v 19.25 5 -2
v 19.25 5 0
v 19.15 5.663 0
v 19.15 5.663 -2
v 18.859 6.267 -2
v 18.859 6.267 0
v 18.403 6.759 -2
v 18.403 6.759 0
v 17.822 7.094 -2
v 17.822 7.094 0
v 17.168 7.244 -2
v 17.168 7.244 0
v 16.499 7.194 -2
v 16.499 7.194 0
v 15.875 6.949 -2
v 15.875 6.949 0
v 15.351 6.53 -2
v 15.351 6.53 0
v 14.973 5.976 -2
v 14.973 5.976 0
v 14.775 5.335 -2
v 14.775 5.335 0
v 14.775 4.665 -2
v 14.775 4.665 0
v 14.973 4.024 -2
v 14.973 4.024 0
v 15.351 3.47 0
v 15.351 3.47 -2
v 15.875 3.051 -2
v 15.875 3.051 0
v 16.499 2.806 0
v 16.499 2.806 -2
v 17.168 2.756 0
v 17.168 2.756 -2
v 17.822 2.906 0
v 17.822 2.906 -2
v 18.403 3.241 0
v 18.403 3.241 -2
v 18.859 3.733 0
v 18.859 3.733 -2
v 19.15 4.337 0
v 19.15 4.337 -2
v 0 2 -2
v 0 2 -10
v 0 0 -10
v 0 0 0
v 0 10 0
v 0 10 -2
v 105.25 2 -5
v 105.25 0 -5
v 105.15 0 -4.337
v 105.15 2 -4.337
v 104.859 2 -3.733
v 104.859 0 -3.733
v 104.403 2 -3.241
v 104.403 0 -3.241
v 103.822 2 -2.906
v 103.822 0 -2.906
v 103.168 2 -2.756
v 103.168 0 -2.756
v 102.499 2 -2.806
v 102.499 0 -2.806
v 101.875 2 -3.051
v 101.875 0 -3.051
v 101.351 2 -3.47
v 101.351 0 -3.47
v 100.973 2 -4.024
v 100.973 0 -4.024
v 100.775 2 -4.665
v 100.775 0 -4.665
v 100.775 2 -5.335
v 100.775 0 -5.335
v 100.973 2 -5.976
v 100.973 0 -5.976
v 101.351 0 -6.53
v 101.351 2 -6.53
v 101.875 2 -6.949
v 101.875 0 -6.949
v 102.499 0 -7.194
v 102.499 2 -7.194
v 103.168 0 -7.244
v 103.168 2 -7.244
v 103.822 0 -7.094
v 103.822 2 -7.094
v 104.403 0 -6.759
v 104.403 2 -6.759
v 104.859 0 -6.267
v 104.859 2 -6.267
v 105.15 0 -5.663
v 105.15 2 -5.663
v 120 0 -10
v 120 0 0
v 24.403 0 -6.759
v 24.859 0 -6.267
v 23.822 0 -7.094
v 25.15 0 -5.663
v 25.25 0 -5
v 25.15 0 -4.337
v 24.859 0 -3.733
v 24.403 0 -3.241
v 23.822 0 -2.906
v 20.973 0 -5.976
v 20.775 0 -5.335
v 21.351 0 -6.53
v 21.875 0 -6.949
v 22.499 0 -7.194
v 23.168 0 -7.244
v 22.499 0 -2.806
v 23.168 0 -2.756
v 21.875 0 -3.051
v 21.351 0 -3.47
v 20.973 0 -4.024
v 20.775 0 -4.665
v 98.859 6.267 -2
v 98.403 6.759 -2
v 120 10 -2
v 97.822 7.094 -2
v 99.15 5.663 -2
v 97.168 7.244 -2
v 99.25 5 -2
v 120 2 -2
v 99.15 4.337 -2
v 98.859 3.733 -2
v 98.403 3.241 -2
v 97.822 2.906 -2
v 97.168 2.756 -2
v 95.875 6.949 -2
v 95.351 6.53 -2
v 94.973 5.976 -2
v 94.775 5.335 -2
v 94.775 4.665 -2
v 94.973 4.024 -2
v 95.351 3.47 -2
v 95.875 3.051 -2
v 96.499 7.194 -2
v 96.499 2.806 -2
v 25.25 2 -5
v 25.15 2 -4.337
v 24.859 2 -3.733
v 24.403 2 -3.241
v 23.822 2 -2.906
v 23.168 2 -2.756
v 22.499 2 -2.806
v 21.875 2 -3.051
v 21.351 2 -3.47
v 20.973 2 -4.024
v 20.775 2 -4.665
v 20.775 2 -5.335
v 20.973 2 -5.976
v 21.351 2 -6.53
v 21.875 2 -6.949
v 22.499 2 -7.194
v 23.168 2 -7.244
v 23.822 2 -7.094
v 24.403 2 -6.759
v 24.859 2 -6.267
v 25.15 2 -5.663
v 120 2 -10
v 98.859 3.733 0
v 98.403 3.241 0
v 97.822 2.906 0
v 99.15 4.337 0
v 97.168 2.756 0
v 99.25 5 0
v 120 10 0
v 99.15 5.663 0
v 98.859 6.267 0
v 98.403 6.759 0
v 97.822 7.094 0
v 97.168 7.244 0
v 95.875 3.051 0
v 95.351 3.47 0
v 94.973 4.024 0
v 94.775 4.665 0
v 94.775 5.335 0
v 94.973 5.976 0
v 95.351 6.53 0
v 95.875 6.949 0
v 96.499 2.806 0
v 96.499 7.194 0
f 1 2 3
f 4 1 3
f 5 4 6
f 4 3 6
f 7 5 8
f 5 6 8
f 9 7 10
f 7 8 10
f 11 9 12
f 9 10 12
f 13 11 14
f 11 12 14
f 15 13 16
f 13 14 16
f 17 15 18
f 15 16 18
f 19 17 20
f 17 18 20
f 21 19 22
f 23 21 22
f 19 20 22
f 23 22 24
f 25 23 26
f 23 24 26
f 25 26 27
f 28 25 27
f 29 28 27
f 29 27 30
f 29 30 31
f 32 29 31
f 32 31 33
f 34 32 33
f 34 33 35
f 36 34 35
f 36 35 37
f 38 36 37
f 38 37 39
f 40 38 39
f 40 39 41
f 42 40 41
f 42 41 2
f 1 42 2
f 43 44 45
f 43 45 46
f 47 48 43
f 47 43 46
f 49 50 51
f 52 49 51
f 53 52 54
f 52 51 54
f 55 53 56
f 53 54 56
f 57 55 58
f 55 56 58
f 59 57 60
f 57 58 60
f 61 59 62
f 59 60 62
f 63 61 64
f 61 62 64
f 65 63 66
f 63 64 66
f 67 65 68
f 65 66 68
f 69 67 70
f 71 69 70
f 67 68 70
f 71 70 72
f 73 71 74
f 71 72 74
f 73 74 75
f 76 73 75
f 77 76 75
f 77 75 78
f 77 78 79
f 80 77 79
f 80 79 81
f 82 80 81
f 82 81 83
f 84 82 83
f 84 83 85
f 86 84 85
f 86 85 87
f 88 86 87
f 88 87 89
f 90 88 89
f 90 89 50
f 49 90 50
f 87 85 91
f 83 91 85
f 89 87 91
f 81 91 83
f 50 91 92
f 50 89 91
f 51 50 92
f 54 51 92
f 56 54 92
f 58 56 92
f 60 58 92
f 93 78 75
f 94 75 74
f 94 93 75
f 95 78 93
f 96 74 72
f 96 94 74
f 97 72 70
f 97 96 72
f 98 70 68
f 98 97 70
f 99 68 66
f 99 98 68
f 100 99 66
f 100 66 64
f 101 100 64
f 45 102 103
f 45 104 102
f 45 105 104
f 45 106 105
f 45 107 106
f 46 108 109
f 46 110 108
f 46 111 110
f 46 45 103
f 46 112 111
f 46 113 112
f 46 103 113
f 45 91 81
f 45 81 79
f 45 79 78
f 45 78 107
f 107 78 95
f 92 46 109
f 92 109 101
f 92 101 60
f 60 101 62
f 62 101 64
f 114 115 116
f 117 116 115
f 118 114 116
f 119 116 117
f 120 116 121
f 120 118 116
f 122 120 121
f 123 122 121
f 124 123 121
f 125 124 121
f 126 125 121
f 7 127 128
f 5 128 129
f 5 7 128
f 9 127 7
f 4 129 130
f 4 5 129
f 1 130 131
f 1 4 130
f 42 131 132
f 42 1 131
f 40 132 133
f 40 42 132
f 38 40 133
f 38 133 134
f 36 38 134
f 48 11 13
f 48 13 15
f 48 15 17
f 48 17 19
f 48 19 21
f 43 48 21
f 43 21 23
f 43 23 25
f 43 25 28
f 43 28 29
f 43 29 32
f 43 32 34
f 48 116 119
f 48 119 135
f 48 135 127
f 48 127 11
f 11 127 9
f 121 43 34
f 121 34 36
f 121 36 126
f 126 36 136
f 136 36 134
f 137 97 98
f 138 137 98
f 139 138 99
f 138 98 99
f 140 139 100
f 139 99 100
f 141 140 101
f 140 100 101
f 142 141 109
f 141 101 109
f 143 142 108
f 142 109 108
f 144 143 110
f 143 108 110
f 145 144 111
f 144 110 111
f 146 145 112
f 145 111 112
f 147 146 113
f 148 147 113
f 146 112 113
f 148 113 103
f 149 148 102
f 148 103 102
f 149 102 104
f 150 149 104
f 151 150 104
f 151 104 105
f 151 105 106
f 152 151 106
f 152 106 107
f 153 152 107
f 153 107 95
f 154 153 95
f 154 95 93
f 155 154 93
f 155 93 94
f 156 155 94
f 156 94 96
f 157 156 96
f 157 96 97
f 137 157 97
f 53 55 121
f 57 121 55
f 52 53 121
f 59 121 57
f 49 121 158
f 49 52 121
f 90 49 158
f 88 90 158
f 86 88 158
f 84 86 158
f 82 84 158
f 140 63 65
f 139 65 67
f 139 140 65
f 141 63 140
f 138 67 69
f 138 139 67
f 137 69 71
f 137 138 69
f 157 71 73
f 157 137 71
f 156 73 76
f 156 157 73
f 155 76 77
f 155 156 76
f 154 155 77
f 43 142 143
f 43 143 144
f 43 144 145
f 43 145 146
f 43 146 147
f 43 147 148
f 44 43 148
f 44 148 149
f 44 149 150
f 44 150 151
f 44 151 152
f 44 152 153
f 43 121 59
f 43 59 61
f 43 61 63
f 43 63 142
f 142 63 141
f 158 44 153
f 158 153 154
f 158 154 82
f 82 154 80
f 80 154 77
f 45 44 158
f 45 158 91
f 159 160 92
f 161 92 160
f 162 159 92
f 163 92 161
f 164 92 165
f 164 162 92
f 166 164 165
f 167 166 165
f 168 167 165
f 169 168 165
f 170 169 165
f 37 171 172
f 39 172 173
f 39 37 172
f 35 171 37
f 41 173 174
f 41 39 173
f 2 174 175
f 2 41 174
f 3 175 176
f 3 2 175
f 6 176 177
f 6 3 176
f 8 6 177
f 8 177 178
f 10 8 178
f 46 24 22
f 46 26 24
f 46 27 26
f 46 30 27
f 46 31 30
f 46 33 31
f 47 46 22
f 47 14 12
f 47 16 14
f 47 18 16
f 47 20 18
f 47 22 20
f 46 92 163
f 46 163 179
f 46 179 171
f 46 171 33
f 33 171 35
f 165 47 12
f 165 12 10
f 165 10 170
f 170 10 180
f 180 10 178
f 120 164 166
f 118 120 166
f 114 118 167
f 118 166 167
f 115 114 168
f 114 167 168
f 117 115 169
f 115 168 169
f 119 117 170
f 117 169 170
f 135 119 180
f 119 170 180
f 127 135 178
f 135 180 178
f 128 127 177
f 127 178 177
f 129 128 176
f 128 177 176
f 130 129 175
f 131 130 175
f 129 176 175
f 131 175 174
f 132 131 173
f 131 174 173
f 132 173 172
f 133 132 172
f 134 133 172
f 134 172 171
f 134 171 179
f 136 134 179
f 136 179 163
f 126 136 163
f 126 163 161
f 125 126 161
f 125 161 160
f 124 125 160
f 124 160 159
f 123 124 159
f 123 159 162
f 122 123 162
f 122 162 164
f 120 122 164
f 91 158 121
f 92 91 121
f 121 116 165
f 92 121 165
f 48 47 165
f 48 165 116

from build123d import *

# Parameters (mm, degrees)
EXTRUDE_1_DEPTH     = 120
CUT_EXTRUDE_1_REACH = 12
SKETCH_2_R          = 2.25
CUT_EXTRUDE_2_REACH = 12
SKETCH_3_R          = 2.25


with BuildPart() as part:
    # Эскиз1 → Бобышка-Вытянуть1 (new body)
    with BuildSketch(Plane(origin=(0, 0, 0), x_dir=(0, 0, -1), z_dir=(1, 0, 0))):
        Polygon((0, 0), (0, 10), (2, 10), (2, 2), (10, 2), (10, 0), align=None)
    extrude(amount=EXTRUDE_1_DEPTH)

    # Эскиз2 → Вырез-Вытянуть1 (cut, up to next)
    with BuildSketch(Plane.XY, mode=Mode.PRIVATE) as cut_extrude_1_sk1:
        with Locations((97, 5)):
            Circle(SKETCH_2_R)
    cut_extrude_1_tool1 = extrude(cut_extrude_1_sk1.sketch, amount=-CUT_EXTRUDE_1_REACH, mode=Mode.PRIVATE) & part.part
    add(cut_extrude_1_tool1.solids().sort_by_distance((97, 5, 0))[0], mode=Mode.SUBTRACT)
    # Эскиз2 → Вырез-Вытянуть1 (cut, up to next)
    with BuildSketch(Plane.XY, mode=Mode.PRIVATE) as cut_extrude_1_sk2:
        with Locations((17, 5)):
            Circle(SKETCH_2_R)
    cut_extrude_1_tool2 = extrude(cut_extrude_1_sk2.sketch, amount=-CUT_EXTRUDE_1_REACH, mode=Mode.PRIVATE) & part.part
    add(cut_extrude_1_tool2.solids().sort_by_distance((17, 5, 0))[0], mode=Mode.SUBTRACT)

    # Эскиз3 → Вырез-Вытянуть2 (cut, up to next)
    with BuildSketch(Plane.XZ, mode=Mode.PRIVATE) as cut_extrude_2_sk1:
        with Locations((103, -5)):
            Circle(SKETCH_3_R)
    cut_extrude_2_tool1 = extrude(cut_extrude_2_sk1.sketch, amount=-CUT_EXTRUDE_2_REACH, mode=Mode.PRIVATE) & part.part
    add(cut_extrude_2_tool1.solids().sort_by_distance((103, 0, -5))[0], mode=Mode.SUBTRACT)
    # Эскиз3 → Вырез-Вытянуть2 (cut, up to next)
    with BuildSketch(Plane.XZ, mode=Mode.PRIVATE) as cut_extrude_2_sk2:
        with Locations((23, -5)):
            Circle(SKETCH_3_R)
    cut_extrude_2_tool2 = extrude(cut_extrude_2_sk2.sketch, amount=-CUT_EXTRUDE_2_REACH, mode=Mode.PRIVATE) & part.part
    add(cut_extrude_2_tool2.solids().sort_by_distance((23, 0, -5))[0], mode=Mode.SUBTRACT)


solid = part.part
